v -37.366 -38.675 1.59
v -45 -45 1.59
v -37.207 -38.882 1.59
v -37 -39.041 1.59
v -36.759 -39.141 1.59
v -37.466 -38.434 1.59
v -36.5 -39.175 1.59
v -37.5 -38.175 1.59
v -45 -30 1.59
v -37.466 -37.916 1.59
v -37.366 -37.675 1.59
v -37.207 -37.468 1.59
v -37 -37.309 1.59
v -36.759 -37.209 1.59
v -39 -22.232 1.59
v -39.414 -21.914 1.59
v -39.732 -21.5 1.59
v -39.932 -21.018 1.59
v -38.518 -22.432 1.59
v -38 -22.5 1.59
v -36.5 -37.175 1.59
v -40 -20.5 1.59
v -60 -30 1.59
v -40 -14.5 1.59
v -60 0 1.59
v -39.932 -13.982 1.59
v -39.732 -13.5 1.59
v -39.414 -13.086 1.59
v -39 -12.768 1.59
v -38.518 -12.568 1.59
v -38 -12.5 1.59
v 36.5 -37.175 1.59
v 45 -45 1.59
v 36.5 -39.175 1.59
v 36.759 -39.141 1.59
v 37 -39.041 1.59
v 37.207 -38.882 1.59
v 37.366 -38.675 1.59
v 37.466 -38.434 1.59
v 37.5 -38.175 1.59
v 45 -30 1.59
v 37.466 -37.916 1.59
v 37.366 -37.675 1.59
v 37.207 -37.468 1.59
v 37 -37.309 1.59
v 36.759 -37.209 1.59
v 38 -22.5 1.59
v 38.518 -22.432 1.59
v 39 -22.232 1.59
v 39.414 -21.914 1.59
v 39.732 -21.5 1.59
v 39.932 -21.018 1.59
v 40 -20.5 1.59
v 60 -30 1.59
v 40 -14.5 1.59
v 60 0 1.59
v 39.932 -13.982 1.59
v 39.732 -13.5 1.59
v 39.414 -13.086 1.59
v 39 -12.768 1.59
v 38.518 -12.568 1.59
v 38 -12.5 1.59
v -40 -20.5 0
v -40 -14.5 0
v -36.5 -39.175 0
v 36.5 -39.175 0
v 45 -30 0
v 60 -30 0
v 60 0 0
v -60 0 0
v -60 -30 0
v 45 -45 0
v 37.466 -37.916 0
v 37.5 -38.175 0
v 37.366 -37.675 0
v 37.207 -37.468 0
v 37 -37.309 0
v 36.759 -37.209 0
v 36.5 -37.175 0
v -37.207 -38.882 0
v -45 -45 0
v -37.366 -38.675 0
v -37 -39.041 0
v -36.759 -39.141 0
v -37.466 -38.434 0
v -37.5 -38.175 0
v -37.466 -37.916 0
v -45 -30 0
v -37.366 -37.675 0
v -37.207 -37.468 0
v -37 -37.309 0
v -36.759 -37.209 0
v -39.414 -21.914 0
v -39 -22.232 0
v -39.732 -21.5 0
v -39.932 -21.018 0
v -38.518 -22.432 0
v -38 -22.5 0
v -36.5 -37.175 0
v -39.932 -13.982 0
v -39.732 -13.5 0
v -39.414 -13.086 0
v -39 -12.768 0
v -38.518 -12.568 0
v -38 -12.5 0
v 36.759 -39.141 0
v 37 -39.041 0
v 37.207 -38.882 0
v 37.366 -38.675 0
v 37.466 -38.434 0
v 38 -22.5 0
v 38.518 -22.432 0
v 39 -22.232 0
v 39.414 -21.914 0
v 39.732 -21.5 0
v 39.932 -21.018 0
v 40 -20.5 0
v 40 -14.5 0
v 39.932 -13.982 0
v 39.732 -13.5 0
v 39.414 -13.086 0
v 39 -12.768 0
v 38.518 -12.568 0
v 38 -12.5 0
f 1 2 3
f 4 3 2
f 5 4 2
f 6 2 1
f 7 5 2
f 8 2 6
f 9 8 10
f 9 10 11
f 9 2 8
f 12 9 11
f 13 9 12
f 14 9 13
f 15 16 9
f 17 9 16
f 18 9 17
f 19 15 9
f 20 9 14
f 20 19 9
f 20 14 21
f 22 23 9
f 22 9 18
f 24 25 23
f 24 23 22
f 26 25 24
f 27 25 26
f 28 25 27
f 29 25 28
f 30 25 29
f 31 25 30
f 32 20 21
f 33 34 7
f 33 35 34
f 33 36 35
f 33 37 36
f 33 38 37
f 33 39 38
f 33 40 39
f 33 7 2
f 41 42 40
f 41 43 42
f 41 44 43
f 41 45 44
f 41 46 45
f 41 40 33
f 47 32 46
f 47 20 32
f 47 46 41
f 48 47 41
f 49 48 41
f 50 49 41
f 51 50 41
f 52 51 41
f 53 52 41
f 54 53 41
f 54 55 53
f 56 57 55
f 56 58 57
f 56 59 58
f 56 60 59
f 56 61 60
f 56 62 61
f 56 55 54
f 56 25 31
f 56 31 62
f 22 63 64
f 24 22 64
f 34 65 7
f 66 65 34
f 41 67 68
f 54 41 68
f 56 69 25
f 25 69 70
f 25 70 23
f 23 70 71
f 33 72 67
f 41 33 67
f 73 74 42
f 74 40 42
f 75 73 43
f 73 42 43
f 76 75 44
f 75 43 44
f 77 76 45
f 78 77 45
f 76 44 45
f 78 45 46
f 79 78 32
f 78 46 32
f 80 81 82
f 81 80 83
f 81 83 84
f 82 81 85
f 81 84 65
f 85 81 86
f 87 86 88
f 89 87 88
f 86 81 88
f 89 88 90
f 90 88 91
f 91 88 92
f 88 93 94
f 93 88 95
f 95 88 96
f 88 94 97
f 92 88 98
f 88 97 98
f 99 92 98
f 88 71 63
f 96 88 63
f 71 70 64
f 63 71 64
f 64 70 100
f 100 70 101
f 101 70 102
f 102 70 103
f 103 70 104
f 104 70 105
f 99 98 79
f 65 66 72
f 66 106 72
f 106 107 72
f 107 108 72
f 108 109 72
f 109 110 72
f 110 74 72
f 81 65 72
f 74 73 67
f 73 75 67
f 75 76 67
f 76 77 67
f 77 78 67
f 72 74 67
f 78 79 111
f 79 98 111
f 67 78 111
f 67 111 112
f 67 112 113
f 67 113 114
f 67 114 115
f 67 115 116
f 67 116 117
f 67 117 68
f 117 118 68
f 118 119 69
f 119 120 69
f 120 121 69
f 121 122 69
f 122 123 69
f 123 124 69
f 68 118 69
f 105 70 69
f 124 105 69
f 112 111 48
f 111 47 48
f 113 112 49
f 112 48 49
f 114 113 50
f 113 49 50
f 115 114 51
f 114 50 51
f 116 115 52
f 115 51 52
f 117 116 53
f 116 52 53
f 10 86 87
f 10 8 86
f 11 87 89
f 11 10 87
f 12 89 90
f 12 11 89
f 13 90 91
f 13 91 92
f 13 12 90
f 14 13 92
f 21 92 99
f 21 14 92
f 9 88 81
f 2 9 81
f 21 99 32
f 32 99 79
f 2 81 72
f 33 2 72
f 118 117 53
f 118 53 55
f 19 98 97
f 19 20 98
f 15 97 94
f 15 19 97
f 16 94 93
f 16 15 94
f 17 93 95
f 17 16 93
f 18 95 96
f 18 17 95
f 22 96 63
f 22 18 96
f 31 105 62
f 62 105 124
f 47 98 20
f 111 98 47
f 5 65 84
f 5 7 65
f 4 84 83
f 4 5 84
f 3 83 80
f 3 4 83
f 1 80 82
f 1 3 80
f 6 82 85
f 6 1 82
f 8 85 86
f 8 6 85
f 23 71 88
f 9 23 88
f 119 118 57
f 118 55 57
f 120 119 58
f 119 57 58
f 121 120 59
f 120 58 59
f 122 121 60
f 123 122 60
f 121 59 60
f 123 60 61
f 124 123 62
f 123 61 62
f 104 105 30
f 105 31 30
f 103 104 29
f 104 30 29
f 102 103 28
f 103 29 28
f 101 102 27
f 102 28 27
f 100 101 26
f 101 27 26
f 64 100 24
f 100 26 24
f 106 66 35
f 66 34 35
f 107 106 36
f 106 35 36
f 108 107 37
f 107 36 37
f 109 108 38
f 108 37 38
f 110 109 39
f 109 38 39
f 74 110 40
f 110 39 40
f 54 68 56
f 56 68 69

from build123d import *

# Parameters (mm, degrees)
F0_W     = 75
F0_H     = 2
F0_W_2   = 80
F0_H_2   = 10
F1_DEPTH = 1.59
F2_R     = 2
F3_R     = 0.99999


# Not quite as in the source:
# - a fillet or chamfer is up to 0.001 mm smaller than in the source, because OpenCascade refuses the exact size


with BuildPart() as f1:
    # F0 (on Top) → F1 (new body)
    with BuildSketch(Plane.XY):
        Polygon((45, 0), (-45, 0), (-60, 0), (-60, -30), (-45, -30), (-45, -45), (45, -45), (45, -30), (60, -30), (60, 0), align=None)
        with Locations((0, -38.175)):
            Rectangle(F0_W, F0_H, mode=Mode.SUBTRACT)
        with Locations((0, -17.5)):
            Rectangle(F0_W_2, F0_H_2, mode=Mode.SUBTRACT)
    extrude(amount=F1_DEPTH)

    # F2
    f2_edges = [f1.edges().sort_by_distance(p)[0] for p in [
        (40, -22.5, 0.795),
        (-40, -12.5, 0.795),
        (40, -12.5, 0.795),
        (-40, -22.5, 0.795),
    ]]
    fillet(f2_edges, radius=F2_R)

    # F3 (radius 1 in the source; OpenCascade refuses exactly that, so slightly less here)
    f3_edges = [f1.edges().sort_by_distance(p)[0] for p in [
        (-37.5, -37.175, 0.795),
        (37.5, -37.175, 0.795),
        (37.5, -39.175, 0.795),
        (-37.5, -39.175, 0.795),
    ]]
    fillet(f3_edges, radius=F3_R)


solid = f1.part
